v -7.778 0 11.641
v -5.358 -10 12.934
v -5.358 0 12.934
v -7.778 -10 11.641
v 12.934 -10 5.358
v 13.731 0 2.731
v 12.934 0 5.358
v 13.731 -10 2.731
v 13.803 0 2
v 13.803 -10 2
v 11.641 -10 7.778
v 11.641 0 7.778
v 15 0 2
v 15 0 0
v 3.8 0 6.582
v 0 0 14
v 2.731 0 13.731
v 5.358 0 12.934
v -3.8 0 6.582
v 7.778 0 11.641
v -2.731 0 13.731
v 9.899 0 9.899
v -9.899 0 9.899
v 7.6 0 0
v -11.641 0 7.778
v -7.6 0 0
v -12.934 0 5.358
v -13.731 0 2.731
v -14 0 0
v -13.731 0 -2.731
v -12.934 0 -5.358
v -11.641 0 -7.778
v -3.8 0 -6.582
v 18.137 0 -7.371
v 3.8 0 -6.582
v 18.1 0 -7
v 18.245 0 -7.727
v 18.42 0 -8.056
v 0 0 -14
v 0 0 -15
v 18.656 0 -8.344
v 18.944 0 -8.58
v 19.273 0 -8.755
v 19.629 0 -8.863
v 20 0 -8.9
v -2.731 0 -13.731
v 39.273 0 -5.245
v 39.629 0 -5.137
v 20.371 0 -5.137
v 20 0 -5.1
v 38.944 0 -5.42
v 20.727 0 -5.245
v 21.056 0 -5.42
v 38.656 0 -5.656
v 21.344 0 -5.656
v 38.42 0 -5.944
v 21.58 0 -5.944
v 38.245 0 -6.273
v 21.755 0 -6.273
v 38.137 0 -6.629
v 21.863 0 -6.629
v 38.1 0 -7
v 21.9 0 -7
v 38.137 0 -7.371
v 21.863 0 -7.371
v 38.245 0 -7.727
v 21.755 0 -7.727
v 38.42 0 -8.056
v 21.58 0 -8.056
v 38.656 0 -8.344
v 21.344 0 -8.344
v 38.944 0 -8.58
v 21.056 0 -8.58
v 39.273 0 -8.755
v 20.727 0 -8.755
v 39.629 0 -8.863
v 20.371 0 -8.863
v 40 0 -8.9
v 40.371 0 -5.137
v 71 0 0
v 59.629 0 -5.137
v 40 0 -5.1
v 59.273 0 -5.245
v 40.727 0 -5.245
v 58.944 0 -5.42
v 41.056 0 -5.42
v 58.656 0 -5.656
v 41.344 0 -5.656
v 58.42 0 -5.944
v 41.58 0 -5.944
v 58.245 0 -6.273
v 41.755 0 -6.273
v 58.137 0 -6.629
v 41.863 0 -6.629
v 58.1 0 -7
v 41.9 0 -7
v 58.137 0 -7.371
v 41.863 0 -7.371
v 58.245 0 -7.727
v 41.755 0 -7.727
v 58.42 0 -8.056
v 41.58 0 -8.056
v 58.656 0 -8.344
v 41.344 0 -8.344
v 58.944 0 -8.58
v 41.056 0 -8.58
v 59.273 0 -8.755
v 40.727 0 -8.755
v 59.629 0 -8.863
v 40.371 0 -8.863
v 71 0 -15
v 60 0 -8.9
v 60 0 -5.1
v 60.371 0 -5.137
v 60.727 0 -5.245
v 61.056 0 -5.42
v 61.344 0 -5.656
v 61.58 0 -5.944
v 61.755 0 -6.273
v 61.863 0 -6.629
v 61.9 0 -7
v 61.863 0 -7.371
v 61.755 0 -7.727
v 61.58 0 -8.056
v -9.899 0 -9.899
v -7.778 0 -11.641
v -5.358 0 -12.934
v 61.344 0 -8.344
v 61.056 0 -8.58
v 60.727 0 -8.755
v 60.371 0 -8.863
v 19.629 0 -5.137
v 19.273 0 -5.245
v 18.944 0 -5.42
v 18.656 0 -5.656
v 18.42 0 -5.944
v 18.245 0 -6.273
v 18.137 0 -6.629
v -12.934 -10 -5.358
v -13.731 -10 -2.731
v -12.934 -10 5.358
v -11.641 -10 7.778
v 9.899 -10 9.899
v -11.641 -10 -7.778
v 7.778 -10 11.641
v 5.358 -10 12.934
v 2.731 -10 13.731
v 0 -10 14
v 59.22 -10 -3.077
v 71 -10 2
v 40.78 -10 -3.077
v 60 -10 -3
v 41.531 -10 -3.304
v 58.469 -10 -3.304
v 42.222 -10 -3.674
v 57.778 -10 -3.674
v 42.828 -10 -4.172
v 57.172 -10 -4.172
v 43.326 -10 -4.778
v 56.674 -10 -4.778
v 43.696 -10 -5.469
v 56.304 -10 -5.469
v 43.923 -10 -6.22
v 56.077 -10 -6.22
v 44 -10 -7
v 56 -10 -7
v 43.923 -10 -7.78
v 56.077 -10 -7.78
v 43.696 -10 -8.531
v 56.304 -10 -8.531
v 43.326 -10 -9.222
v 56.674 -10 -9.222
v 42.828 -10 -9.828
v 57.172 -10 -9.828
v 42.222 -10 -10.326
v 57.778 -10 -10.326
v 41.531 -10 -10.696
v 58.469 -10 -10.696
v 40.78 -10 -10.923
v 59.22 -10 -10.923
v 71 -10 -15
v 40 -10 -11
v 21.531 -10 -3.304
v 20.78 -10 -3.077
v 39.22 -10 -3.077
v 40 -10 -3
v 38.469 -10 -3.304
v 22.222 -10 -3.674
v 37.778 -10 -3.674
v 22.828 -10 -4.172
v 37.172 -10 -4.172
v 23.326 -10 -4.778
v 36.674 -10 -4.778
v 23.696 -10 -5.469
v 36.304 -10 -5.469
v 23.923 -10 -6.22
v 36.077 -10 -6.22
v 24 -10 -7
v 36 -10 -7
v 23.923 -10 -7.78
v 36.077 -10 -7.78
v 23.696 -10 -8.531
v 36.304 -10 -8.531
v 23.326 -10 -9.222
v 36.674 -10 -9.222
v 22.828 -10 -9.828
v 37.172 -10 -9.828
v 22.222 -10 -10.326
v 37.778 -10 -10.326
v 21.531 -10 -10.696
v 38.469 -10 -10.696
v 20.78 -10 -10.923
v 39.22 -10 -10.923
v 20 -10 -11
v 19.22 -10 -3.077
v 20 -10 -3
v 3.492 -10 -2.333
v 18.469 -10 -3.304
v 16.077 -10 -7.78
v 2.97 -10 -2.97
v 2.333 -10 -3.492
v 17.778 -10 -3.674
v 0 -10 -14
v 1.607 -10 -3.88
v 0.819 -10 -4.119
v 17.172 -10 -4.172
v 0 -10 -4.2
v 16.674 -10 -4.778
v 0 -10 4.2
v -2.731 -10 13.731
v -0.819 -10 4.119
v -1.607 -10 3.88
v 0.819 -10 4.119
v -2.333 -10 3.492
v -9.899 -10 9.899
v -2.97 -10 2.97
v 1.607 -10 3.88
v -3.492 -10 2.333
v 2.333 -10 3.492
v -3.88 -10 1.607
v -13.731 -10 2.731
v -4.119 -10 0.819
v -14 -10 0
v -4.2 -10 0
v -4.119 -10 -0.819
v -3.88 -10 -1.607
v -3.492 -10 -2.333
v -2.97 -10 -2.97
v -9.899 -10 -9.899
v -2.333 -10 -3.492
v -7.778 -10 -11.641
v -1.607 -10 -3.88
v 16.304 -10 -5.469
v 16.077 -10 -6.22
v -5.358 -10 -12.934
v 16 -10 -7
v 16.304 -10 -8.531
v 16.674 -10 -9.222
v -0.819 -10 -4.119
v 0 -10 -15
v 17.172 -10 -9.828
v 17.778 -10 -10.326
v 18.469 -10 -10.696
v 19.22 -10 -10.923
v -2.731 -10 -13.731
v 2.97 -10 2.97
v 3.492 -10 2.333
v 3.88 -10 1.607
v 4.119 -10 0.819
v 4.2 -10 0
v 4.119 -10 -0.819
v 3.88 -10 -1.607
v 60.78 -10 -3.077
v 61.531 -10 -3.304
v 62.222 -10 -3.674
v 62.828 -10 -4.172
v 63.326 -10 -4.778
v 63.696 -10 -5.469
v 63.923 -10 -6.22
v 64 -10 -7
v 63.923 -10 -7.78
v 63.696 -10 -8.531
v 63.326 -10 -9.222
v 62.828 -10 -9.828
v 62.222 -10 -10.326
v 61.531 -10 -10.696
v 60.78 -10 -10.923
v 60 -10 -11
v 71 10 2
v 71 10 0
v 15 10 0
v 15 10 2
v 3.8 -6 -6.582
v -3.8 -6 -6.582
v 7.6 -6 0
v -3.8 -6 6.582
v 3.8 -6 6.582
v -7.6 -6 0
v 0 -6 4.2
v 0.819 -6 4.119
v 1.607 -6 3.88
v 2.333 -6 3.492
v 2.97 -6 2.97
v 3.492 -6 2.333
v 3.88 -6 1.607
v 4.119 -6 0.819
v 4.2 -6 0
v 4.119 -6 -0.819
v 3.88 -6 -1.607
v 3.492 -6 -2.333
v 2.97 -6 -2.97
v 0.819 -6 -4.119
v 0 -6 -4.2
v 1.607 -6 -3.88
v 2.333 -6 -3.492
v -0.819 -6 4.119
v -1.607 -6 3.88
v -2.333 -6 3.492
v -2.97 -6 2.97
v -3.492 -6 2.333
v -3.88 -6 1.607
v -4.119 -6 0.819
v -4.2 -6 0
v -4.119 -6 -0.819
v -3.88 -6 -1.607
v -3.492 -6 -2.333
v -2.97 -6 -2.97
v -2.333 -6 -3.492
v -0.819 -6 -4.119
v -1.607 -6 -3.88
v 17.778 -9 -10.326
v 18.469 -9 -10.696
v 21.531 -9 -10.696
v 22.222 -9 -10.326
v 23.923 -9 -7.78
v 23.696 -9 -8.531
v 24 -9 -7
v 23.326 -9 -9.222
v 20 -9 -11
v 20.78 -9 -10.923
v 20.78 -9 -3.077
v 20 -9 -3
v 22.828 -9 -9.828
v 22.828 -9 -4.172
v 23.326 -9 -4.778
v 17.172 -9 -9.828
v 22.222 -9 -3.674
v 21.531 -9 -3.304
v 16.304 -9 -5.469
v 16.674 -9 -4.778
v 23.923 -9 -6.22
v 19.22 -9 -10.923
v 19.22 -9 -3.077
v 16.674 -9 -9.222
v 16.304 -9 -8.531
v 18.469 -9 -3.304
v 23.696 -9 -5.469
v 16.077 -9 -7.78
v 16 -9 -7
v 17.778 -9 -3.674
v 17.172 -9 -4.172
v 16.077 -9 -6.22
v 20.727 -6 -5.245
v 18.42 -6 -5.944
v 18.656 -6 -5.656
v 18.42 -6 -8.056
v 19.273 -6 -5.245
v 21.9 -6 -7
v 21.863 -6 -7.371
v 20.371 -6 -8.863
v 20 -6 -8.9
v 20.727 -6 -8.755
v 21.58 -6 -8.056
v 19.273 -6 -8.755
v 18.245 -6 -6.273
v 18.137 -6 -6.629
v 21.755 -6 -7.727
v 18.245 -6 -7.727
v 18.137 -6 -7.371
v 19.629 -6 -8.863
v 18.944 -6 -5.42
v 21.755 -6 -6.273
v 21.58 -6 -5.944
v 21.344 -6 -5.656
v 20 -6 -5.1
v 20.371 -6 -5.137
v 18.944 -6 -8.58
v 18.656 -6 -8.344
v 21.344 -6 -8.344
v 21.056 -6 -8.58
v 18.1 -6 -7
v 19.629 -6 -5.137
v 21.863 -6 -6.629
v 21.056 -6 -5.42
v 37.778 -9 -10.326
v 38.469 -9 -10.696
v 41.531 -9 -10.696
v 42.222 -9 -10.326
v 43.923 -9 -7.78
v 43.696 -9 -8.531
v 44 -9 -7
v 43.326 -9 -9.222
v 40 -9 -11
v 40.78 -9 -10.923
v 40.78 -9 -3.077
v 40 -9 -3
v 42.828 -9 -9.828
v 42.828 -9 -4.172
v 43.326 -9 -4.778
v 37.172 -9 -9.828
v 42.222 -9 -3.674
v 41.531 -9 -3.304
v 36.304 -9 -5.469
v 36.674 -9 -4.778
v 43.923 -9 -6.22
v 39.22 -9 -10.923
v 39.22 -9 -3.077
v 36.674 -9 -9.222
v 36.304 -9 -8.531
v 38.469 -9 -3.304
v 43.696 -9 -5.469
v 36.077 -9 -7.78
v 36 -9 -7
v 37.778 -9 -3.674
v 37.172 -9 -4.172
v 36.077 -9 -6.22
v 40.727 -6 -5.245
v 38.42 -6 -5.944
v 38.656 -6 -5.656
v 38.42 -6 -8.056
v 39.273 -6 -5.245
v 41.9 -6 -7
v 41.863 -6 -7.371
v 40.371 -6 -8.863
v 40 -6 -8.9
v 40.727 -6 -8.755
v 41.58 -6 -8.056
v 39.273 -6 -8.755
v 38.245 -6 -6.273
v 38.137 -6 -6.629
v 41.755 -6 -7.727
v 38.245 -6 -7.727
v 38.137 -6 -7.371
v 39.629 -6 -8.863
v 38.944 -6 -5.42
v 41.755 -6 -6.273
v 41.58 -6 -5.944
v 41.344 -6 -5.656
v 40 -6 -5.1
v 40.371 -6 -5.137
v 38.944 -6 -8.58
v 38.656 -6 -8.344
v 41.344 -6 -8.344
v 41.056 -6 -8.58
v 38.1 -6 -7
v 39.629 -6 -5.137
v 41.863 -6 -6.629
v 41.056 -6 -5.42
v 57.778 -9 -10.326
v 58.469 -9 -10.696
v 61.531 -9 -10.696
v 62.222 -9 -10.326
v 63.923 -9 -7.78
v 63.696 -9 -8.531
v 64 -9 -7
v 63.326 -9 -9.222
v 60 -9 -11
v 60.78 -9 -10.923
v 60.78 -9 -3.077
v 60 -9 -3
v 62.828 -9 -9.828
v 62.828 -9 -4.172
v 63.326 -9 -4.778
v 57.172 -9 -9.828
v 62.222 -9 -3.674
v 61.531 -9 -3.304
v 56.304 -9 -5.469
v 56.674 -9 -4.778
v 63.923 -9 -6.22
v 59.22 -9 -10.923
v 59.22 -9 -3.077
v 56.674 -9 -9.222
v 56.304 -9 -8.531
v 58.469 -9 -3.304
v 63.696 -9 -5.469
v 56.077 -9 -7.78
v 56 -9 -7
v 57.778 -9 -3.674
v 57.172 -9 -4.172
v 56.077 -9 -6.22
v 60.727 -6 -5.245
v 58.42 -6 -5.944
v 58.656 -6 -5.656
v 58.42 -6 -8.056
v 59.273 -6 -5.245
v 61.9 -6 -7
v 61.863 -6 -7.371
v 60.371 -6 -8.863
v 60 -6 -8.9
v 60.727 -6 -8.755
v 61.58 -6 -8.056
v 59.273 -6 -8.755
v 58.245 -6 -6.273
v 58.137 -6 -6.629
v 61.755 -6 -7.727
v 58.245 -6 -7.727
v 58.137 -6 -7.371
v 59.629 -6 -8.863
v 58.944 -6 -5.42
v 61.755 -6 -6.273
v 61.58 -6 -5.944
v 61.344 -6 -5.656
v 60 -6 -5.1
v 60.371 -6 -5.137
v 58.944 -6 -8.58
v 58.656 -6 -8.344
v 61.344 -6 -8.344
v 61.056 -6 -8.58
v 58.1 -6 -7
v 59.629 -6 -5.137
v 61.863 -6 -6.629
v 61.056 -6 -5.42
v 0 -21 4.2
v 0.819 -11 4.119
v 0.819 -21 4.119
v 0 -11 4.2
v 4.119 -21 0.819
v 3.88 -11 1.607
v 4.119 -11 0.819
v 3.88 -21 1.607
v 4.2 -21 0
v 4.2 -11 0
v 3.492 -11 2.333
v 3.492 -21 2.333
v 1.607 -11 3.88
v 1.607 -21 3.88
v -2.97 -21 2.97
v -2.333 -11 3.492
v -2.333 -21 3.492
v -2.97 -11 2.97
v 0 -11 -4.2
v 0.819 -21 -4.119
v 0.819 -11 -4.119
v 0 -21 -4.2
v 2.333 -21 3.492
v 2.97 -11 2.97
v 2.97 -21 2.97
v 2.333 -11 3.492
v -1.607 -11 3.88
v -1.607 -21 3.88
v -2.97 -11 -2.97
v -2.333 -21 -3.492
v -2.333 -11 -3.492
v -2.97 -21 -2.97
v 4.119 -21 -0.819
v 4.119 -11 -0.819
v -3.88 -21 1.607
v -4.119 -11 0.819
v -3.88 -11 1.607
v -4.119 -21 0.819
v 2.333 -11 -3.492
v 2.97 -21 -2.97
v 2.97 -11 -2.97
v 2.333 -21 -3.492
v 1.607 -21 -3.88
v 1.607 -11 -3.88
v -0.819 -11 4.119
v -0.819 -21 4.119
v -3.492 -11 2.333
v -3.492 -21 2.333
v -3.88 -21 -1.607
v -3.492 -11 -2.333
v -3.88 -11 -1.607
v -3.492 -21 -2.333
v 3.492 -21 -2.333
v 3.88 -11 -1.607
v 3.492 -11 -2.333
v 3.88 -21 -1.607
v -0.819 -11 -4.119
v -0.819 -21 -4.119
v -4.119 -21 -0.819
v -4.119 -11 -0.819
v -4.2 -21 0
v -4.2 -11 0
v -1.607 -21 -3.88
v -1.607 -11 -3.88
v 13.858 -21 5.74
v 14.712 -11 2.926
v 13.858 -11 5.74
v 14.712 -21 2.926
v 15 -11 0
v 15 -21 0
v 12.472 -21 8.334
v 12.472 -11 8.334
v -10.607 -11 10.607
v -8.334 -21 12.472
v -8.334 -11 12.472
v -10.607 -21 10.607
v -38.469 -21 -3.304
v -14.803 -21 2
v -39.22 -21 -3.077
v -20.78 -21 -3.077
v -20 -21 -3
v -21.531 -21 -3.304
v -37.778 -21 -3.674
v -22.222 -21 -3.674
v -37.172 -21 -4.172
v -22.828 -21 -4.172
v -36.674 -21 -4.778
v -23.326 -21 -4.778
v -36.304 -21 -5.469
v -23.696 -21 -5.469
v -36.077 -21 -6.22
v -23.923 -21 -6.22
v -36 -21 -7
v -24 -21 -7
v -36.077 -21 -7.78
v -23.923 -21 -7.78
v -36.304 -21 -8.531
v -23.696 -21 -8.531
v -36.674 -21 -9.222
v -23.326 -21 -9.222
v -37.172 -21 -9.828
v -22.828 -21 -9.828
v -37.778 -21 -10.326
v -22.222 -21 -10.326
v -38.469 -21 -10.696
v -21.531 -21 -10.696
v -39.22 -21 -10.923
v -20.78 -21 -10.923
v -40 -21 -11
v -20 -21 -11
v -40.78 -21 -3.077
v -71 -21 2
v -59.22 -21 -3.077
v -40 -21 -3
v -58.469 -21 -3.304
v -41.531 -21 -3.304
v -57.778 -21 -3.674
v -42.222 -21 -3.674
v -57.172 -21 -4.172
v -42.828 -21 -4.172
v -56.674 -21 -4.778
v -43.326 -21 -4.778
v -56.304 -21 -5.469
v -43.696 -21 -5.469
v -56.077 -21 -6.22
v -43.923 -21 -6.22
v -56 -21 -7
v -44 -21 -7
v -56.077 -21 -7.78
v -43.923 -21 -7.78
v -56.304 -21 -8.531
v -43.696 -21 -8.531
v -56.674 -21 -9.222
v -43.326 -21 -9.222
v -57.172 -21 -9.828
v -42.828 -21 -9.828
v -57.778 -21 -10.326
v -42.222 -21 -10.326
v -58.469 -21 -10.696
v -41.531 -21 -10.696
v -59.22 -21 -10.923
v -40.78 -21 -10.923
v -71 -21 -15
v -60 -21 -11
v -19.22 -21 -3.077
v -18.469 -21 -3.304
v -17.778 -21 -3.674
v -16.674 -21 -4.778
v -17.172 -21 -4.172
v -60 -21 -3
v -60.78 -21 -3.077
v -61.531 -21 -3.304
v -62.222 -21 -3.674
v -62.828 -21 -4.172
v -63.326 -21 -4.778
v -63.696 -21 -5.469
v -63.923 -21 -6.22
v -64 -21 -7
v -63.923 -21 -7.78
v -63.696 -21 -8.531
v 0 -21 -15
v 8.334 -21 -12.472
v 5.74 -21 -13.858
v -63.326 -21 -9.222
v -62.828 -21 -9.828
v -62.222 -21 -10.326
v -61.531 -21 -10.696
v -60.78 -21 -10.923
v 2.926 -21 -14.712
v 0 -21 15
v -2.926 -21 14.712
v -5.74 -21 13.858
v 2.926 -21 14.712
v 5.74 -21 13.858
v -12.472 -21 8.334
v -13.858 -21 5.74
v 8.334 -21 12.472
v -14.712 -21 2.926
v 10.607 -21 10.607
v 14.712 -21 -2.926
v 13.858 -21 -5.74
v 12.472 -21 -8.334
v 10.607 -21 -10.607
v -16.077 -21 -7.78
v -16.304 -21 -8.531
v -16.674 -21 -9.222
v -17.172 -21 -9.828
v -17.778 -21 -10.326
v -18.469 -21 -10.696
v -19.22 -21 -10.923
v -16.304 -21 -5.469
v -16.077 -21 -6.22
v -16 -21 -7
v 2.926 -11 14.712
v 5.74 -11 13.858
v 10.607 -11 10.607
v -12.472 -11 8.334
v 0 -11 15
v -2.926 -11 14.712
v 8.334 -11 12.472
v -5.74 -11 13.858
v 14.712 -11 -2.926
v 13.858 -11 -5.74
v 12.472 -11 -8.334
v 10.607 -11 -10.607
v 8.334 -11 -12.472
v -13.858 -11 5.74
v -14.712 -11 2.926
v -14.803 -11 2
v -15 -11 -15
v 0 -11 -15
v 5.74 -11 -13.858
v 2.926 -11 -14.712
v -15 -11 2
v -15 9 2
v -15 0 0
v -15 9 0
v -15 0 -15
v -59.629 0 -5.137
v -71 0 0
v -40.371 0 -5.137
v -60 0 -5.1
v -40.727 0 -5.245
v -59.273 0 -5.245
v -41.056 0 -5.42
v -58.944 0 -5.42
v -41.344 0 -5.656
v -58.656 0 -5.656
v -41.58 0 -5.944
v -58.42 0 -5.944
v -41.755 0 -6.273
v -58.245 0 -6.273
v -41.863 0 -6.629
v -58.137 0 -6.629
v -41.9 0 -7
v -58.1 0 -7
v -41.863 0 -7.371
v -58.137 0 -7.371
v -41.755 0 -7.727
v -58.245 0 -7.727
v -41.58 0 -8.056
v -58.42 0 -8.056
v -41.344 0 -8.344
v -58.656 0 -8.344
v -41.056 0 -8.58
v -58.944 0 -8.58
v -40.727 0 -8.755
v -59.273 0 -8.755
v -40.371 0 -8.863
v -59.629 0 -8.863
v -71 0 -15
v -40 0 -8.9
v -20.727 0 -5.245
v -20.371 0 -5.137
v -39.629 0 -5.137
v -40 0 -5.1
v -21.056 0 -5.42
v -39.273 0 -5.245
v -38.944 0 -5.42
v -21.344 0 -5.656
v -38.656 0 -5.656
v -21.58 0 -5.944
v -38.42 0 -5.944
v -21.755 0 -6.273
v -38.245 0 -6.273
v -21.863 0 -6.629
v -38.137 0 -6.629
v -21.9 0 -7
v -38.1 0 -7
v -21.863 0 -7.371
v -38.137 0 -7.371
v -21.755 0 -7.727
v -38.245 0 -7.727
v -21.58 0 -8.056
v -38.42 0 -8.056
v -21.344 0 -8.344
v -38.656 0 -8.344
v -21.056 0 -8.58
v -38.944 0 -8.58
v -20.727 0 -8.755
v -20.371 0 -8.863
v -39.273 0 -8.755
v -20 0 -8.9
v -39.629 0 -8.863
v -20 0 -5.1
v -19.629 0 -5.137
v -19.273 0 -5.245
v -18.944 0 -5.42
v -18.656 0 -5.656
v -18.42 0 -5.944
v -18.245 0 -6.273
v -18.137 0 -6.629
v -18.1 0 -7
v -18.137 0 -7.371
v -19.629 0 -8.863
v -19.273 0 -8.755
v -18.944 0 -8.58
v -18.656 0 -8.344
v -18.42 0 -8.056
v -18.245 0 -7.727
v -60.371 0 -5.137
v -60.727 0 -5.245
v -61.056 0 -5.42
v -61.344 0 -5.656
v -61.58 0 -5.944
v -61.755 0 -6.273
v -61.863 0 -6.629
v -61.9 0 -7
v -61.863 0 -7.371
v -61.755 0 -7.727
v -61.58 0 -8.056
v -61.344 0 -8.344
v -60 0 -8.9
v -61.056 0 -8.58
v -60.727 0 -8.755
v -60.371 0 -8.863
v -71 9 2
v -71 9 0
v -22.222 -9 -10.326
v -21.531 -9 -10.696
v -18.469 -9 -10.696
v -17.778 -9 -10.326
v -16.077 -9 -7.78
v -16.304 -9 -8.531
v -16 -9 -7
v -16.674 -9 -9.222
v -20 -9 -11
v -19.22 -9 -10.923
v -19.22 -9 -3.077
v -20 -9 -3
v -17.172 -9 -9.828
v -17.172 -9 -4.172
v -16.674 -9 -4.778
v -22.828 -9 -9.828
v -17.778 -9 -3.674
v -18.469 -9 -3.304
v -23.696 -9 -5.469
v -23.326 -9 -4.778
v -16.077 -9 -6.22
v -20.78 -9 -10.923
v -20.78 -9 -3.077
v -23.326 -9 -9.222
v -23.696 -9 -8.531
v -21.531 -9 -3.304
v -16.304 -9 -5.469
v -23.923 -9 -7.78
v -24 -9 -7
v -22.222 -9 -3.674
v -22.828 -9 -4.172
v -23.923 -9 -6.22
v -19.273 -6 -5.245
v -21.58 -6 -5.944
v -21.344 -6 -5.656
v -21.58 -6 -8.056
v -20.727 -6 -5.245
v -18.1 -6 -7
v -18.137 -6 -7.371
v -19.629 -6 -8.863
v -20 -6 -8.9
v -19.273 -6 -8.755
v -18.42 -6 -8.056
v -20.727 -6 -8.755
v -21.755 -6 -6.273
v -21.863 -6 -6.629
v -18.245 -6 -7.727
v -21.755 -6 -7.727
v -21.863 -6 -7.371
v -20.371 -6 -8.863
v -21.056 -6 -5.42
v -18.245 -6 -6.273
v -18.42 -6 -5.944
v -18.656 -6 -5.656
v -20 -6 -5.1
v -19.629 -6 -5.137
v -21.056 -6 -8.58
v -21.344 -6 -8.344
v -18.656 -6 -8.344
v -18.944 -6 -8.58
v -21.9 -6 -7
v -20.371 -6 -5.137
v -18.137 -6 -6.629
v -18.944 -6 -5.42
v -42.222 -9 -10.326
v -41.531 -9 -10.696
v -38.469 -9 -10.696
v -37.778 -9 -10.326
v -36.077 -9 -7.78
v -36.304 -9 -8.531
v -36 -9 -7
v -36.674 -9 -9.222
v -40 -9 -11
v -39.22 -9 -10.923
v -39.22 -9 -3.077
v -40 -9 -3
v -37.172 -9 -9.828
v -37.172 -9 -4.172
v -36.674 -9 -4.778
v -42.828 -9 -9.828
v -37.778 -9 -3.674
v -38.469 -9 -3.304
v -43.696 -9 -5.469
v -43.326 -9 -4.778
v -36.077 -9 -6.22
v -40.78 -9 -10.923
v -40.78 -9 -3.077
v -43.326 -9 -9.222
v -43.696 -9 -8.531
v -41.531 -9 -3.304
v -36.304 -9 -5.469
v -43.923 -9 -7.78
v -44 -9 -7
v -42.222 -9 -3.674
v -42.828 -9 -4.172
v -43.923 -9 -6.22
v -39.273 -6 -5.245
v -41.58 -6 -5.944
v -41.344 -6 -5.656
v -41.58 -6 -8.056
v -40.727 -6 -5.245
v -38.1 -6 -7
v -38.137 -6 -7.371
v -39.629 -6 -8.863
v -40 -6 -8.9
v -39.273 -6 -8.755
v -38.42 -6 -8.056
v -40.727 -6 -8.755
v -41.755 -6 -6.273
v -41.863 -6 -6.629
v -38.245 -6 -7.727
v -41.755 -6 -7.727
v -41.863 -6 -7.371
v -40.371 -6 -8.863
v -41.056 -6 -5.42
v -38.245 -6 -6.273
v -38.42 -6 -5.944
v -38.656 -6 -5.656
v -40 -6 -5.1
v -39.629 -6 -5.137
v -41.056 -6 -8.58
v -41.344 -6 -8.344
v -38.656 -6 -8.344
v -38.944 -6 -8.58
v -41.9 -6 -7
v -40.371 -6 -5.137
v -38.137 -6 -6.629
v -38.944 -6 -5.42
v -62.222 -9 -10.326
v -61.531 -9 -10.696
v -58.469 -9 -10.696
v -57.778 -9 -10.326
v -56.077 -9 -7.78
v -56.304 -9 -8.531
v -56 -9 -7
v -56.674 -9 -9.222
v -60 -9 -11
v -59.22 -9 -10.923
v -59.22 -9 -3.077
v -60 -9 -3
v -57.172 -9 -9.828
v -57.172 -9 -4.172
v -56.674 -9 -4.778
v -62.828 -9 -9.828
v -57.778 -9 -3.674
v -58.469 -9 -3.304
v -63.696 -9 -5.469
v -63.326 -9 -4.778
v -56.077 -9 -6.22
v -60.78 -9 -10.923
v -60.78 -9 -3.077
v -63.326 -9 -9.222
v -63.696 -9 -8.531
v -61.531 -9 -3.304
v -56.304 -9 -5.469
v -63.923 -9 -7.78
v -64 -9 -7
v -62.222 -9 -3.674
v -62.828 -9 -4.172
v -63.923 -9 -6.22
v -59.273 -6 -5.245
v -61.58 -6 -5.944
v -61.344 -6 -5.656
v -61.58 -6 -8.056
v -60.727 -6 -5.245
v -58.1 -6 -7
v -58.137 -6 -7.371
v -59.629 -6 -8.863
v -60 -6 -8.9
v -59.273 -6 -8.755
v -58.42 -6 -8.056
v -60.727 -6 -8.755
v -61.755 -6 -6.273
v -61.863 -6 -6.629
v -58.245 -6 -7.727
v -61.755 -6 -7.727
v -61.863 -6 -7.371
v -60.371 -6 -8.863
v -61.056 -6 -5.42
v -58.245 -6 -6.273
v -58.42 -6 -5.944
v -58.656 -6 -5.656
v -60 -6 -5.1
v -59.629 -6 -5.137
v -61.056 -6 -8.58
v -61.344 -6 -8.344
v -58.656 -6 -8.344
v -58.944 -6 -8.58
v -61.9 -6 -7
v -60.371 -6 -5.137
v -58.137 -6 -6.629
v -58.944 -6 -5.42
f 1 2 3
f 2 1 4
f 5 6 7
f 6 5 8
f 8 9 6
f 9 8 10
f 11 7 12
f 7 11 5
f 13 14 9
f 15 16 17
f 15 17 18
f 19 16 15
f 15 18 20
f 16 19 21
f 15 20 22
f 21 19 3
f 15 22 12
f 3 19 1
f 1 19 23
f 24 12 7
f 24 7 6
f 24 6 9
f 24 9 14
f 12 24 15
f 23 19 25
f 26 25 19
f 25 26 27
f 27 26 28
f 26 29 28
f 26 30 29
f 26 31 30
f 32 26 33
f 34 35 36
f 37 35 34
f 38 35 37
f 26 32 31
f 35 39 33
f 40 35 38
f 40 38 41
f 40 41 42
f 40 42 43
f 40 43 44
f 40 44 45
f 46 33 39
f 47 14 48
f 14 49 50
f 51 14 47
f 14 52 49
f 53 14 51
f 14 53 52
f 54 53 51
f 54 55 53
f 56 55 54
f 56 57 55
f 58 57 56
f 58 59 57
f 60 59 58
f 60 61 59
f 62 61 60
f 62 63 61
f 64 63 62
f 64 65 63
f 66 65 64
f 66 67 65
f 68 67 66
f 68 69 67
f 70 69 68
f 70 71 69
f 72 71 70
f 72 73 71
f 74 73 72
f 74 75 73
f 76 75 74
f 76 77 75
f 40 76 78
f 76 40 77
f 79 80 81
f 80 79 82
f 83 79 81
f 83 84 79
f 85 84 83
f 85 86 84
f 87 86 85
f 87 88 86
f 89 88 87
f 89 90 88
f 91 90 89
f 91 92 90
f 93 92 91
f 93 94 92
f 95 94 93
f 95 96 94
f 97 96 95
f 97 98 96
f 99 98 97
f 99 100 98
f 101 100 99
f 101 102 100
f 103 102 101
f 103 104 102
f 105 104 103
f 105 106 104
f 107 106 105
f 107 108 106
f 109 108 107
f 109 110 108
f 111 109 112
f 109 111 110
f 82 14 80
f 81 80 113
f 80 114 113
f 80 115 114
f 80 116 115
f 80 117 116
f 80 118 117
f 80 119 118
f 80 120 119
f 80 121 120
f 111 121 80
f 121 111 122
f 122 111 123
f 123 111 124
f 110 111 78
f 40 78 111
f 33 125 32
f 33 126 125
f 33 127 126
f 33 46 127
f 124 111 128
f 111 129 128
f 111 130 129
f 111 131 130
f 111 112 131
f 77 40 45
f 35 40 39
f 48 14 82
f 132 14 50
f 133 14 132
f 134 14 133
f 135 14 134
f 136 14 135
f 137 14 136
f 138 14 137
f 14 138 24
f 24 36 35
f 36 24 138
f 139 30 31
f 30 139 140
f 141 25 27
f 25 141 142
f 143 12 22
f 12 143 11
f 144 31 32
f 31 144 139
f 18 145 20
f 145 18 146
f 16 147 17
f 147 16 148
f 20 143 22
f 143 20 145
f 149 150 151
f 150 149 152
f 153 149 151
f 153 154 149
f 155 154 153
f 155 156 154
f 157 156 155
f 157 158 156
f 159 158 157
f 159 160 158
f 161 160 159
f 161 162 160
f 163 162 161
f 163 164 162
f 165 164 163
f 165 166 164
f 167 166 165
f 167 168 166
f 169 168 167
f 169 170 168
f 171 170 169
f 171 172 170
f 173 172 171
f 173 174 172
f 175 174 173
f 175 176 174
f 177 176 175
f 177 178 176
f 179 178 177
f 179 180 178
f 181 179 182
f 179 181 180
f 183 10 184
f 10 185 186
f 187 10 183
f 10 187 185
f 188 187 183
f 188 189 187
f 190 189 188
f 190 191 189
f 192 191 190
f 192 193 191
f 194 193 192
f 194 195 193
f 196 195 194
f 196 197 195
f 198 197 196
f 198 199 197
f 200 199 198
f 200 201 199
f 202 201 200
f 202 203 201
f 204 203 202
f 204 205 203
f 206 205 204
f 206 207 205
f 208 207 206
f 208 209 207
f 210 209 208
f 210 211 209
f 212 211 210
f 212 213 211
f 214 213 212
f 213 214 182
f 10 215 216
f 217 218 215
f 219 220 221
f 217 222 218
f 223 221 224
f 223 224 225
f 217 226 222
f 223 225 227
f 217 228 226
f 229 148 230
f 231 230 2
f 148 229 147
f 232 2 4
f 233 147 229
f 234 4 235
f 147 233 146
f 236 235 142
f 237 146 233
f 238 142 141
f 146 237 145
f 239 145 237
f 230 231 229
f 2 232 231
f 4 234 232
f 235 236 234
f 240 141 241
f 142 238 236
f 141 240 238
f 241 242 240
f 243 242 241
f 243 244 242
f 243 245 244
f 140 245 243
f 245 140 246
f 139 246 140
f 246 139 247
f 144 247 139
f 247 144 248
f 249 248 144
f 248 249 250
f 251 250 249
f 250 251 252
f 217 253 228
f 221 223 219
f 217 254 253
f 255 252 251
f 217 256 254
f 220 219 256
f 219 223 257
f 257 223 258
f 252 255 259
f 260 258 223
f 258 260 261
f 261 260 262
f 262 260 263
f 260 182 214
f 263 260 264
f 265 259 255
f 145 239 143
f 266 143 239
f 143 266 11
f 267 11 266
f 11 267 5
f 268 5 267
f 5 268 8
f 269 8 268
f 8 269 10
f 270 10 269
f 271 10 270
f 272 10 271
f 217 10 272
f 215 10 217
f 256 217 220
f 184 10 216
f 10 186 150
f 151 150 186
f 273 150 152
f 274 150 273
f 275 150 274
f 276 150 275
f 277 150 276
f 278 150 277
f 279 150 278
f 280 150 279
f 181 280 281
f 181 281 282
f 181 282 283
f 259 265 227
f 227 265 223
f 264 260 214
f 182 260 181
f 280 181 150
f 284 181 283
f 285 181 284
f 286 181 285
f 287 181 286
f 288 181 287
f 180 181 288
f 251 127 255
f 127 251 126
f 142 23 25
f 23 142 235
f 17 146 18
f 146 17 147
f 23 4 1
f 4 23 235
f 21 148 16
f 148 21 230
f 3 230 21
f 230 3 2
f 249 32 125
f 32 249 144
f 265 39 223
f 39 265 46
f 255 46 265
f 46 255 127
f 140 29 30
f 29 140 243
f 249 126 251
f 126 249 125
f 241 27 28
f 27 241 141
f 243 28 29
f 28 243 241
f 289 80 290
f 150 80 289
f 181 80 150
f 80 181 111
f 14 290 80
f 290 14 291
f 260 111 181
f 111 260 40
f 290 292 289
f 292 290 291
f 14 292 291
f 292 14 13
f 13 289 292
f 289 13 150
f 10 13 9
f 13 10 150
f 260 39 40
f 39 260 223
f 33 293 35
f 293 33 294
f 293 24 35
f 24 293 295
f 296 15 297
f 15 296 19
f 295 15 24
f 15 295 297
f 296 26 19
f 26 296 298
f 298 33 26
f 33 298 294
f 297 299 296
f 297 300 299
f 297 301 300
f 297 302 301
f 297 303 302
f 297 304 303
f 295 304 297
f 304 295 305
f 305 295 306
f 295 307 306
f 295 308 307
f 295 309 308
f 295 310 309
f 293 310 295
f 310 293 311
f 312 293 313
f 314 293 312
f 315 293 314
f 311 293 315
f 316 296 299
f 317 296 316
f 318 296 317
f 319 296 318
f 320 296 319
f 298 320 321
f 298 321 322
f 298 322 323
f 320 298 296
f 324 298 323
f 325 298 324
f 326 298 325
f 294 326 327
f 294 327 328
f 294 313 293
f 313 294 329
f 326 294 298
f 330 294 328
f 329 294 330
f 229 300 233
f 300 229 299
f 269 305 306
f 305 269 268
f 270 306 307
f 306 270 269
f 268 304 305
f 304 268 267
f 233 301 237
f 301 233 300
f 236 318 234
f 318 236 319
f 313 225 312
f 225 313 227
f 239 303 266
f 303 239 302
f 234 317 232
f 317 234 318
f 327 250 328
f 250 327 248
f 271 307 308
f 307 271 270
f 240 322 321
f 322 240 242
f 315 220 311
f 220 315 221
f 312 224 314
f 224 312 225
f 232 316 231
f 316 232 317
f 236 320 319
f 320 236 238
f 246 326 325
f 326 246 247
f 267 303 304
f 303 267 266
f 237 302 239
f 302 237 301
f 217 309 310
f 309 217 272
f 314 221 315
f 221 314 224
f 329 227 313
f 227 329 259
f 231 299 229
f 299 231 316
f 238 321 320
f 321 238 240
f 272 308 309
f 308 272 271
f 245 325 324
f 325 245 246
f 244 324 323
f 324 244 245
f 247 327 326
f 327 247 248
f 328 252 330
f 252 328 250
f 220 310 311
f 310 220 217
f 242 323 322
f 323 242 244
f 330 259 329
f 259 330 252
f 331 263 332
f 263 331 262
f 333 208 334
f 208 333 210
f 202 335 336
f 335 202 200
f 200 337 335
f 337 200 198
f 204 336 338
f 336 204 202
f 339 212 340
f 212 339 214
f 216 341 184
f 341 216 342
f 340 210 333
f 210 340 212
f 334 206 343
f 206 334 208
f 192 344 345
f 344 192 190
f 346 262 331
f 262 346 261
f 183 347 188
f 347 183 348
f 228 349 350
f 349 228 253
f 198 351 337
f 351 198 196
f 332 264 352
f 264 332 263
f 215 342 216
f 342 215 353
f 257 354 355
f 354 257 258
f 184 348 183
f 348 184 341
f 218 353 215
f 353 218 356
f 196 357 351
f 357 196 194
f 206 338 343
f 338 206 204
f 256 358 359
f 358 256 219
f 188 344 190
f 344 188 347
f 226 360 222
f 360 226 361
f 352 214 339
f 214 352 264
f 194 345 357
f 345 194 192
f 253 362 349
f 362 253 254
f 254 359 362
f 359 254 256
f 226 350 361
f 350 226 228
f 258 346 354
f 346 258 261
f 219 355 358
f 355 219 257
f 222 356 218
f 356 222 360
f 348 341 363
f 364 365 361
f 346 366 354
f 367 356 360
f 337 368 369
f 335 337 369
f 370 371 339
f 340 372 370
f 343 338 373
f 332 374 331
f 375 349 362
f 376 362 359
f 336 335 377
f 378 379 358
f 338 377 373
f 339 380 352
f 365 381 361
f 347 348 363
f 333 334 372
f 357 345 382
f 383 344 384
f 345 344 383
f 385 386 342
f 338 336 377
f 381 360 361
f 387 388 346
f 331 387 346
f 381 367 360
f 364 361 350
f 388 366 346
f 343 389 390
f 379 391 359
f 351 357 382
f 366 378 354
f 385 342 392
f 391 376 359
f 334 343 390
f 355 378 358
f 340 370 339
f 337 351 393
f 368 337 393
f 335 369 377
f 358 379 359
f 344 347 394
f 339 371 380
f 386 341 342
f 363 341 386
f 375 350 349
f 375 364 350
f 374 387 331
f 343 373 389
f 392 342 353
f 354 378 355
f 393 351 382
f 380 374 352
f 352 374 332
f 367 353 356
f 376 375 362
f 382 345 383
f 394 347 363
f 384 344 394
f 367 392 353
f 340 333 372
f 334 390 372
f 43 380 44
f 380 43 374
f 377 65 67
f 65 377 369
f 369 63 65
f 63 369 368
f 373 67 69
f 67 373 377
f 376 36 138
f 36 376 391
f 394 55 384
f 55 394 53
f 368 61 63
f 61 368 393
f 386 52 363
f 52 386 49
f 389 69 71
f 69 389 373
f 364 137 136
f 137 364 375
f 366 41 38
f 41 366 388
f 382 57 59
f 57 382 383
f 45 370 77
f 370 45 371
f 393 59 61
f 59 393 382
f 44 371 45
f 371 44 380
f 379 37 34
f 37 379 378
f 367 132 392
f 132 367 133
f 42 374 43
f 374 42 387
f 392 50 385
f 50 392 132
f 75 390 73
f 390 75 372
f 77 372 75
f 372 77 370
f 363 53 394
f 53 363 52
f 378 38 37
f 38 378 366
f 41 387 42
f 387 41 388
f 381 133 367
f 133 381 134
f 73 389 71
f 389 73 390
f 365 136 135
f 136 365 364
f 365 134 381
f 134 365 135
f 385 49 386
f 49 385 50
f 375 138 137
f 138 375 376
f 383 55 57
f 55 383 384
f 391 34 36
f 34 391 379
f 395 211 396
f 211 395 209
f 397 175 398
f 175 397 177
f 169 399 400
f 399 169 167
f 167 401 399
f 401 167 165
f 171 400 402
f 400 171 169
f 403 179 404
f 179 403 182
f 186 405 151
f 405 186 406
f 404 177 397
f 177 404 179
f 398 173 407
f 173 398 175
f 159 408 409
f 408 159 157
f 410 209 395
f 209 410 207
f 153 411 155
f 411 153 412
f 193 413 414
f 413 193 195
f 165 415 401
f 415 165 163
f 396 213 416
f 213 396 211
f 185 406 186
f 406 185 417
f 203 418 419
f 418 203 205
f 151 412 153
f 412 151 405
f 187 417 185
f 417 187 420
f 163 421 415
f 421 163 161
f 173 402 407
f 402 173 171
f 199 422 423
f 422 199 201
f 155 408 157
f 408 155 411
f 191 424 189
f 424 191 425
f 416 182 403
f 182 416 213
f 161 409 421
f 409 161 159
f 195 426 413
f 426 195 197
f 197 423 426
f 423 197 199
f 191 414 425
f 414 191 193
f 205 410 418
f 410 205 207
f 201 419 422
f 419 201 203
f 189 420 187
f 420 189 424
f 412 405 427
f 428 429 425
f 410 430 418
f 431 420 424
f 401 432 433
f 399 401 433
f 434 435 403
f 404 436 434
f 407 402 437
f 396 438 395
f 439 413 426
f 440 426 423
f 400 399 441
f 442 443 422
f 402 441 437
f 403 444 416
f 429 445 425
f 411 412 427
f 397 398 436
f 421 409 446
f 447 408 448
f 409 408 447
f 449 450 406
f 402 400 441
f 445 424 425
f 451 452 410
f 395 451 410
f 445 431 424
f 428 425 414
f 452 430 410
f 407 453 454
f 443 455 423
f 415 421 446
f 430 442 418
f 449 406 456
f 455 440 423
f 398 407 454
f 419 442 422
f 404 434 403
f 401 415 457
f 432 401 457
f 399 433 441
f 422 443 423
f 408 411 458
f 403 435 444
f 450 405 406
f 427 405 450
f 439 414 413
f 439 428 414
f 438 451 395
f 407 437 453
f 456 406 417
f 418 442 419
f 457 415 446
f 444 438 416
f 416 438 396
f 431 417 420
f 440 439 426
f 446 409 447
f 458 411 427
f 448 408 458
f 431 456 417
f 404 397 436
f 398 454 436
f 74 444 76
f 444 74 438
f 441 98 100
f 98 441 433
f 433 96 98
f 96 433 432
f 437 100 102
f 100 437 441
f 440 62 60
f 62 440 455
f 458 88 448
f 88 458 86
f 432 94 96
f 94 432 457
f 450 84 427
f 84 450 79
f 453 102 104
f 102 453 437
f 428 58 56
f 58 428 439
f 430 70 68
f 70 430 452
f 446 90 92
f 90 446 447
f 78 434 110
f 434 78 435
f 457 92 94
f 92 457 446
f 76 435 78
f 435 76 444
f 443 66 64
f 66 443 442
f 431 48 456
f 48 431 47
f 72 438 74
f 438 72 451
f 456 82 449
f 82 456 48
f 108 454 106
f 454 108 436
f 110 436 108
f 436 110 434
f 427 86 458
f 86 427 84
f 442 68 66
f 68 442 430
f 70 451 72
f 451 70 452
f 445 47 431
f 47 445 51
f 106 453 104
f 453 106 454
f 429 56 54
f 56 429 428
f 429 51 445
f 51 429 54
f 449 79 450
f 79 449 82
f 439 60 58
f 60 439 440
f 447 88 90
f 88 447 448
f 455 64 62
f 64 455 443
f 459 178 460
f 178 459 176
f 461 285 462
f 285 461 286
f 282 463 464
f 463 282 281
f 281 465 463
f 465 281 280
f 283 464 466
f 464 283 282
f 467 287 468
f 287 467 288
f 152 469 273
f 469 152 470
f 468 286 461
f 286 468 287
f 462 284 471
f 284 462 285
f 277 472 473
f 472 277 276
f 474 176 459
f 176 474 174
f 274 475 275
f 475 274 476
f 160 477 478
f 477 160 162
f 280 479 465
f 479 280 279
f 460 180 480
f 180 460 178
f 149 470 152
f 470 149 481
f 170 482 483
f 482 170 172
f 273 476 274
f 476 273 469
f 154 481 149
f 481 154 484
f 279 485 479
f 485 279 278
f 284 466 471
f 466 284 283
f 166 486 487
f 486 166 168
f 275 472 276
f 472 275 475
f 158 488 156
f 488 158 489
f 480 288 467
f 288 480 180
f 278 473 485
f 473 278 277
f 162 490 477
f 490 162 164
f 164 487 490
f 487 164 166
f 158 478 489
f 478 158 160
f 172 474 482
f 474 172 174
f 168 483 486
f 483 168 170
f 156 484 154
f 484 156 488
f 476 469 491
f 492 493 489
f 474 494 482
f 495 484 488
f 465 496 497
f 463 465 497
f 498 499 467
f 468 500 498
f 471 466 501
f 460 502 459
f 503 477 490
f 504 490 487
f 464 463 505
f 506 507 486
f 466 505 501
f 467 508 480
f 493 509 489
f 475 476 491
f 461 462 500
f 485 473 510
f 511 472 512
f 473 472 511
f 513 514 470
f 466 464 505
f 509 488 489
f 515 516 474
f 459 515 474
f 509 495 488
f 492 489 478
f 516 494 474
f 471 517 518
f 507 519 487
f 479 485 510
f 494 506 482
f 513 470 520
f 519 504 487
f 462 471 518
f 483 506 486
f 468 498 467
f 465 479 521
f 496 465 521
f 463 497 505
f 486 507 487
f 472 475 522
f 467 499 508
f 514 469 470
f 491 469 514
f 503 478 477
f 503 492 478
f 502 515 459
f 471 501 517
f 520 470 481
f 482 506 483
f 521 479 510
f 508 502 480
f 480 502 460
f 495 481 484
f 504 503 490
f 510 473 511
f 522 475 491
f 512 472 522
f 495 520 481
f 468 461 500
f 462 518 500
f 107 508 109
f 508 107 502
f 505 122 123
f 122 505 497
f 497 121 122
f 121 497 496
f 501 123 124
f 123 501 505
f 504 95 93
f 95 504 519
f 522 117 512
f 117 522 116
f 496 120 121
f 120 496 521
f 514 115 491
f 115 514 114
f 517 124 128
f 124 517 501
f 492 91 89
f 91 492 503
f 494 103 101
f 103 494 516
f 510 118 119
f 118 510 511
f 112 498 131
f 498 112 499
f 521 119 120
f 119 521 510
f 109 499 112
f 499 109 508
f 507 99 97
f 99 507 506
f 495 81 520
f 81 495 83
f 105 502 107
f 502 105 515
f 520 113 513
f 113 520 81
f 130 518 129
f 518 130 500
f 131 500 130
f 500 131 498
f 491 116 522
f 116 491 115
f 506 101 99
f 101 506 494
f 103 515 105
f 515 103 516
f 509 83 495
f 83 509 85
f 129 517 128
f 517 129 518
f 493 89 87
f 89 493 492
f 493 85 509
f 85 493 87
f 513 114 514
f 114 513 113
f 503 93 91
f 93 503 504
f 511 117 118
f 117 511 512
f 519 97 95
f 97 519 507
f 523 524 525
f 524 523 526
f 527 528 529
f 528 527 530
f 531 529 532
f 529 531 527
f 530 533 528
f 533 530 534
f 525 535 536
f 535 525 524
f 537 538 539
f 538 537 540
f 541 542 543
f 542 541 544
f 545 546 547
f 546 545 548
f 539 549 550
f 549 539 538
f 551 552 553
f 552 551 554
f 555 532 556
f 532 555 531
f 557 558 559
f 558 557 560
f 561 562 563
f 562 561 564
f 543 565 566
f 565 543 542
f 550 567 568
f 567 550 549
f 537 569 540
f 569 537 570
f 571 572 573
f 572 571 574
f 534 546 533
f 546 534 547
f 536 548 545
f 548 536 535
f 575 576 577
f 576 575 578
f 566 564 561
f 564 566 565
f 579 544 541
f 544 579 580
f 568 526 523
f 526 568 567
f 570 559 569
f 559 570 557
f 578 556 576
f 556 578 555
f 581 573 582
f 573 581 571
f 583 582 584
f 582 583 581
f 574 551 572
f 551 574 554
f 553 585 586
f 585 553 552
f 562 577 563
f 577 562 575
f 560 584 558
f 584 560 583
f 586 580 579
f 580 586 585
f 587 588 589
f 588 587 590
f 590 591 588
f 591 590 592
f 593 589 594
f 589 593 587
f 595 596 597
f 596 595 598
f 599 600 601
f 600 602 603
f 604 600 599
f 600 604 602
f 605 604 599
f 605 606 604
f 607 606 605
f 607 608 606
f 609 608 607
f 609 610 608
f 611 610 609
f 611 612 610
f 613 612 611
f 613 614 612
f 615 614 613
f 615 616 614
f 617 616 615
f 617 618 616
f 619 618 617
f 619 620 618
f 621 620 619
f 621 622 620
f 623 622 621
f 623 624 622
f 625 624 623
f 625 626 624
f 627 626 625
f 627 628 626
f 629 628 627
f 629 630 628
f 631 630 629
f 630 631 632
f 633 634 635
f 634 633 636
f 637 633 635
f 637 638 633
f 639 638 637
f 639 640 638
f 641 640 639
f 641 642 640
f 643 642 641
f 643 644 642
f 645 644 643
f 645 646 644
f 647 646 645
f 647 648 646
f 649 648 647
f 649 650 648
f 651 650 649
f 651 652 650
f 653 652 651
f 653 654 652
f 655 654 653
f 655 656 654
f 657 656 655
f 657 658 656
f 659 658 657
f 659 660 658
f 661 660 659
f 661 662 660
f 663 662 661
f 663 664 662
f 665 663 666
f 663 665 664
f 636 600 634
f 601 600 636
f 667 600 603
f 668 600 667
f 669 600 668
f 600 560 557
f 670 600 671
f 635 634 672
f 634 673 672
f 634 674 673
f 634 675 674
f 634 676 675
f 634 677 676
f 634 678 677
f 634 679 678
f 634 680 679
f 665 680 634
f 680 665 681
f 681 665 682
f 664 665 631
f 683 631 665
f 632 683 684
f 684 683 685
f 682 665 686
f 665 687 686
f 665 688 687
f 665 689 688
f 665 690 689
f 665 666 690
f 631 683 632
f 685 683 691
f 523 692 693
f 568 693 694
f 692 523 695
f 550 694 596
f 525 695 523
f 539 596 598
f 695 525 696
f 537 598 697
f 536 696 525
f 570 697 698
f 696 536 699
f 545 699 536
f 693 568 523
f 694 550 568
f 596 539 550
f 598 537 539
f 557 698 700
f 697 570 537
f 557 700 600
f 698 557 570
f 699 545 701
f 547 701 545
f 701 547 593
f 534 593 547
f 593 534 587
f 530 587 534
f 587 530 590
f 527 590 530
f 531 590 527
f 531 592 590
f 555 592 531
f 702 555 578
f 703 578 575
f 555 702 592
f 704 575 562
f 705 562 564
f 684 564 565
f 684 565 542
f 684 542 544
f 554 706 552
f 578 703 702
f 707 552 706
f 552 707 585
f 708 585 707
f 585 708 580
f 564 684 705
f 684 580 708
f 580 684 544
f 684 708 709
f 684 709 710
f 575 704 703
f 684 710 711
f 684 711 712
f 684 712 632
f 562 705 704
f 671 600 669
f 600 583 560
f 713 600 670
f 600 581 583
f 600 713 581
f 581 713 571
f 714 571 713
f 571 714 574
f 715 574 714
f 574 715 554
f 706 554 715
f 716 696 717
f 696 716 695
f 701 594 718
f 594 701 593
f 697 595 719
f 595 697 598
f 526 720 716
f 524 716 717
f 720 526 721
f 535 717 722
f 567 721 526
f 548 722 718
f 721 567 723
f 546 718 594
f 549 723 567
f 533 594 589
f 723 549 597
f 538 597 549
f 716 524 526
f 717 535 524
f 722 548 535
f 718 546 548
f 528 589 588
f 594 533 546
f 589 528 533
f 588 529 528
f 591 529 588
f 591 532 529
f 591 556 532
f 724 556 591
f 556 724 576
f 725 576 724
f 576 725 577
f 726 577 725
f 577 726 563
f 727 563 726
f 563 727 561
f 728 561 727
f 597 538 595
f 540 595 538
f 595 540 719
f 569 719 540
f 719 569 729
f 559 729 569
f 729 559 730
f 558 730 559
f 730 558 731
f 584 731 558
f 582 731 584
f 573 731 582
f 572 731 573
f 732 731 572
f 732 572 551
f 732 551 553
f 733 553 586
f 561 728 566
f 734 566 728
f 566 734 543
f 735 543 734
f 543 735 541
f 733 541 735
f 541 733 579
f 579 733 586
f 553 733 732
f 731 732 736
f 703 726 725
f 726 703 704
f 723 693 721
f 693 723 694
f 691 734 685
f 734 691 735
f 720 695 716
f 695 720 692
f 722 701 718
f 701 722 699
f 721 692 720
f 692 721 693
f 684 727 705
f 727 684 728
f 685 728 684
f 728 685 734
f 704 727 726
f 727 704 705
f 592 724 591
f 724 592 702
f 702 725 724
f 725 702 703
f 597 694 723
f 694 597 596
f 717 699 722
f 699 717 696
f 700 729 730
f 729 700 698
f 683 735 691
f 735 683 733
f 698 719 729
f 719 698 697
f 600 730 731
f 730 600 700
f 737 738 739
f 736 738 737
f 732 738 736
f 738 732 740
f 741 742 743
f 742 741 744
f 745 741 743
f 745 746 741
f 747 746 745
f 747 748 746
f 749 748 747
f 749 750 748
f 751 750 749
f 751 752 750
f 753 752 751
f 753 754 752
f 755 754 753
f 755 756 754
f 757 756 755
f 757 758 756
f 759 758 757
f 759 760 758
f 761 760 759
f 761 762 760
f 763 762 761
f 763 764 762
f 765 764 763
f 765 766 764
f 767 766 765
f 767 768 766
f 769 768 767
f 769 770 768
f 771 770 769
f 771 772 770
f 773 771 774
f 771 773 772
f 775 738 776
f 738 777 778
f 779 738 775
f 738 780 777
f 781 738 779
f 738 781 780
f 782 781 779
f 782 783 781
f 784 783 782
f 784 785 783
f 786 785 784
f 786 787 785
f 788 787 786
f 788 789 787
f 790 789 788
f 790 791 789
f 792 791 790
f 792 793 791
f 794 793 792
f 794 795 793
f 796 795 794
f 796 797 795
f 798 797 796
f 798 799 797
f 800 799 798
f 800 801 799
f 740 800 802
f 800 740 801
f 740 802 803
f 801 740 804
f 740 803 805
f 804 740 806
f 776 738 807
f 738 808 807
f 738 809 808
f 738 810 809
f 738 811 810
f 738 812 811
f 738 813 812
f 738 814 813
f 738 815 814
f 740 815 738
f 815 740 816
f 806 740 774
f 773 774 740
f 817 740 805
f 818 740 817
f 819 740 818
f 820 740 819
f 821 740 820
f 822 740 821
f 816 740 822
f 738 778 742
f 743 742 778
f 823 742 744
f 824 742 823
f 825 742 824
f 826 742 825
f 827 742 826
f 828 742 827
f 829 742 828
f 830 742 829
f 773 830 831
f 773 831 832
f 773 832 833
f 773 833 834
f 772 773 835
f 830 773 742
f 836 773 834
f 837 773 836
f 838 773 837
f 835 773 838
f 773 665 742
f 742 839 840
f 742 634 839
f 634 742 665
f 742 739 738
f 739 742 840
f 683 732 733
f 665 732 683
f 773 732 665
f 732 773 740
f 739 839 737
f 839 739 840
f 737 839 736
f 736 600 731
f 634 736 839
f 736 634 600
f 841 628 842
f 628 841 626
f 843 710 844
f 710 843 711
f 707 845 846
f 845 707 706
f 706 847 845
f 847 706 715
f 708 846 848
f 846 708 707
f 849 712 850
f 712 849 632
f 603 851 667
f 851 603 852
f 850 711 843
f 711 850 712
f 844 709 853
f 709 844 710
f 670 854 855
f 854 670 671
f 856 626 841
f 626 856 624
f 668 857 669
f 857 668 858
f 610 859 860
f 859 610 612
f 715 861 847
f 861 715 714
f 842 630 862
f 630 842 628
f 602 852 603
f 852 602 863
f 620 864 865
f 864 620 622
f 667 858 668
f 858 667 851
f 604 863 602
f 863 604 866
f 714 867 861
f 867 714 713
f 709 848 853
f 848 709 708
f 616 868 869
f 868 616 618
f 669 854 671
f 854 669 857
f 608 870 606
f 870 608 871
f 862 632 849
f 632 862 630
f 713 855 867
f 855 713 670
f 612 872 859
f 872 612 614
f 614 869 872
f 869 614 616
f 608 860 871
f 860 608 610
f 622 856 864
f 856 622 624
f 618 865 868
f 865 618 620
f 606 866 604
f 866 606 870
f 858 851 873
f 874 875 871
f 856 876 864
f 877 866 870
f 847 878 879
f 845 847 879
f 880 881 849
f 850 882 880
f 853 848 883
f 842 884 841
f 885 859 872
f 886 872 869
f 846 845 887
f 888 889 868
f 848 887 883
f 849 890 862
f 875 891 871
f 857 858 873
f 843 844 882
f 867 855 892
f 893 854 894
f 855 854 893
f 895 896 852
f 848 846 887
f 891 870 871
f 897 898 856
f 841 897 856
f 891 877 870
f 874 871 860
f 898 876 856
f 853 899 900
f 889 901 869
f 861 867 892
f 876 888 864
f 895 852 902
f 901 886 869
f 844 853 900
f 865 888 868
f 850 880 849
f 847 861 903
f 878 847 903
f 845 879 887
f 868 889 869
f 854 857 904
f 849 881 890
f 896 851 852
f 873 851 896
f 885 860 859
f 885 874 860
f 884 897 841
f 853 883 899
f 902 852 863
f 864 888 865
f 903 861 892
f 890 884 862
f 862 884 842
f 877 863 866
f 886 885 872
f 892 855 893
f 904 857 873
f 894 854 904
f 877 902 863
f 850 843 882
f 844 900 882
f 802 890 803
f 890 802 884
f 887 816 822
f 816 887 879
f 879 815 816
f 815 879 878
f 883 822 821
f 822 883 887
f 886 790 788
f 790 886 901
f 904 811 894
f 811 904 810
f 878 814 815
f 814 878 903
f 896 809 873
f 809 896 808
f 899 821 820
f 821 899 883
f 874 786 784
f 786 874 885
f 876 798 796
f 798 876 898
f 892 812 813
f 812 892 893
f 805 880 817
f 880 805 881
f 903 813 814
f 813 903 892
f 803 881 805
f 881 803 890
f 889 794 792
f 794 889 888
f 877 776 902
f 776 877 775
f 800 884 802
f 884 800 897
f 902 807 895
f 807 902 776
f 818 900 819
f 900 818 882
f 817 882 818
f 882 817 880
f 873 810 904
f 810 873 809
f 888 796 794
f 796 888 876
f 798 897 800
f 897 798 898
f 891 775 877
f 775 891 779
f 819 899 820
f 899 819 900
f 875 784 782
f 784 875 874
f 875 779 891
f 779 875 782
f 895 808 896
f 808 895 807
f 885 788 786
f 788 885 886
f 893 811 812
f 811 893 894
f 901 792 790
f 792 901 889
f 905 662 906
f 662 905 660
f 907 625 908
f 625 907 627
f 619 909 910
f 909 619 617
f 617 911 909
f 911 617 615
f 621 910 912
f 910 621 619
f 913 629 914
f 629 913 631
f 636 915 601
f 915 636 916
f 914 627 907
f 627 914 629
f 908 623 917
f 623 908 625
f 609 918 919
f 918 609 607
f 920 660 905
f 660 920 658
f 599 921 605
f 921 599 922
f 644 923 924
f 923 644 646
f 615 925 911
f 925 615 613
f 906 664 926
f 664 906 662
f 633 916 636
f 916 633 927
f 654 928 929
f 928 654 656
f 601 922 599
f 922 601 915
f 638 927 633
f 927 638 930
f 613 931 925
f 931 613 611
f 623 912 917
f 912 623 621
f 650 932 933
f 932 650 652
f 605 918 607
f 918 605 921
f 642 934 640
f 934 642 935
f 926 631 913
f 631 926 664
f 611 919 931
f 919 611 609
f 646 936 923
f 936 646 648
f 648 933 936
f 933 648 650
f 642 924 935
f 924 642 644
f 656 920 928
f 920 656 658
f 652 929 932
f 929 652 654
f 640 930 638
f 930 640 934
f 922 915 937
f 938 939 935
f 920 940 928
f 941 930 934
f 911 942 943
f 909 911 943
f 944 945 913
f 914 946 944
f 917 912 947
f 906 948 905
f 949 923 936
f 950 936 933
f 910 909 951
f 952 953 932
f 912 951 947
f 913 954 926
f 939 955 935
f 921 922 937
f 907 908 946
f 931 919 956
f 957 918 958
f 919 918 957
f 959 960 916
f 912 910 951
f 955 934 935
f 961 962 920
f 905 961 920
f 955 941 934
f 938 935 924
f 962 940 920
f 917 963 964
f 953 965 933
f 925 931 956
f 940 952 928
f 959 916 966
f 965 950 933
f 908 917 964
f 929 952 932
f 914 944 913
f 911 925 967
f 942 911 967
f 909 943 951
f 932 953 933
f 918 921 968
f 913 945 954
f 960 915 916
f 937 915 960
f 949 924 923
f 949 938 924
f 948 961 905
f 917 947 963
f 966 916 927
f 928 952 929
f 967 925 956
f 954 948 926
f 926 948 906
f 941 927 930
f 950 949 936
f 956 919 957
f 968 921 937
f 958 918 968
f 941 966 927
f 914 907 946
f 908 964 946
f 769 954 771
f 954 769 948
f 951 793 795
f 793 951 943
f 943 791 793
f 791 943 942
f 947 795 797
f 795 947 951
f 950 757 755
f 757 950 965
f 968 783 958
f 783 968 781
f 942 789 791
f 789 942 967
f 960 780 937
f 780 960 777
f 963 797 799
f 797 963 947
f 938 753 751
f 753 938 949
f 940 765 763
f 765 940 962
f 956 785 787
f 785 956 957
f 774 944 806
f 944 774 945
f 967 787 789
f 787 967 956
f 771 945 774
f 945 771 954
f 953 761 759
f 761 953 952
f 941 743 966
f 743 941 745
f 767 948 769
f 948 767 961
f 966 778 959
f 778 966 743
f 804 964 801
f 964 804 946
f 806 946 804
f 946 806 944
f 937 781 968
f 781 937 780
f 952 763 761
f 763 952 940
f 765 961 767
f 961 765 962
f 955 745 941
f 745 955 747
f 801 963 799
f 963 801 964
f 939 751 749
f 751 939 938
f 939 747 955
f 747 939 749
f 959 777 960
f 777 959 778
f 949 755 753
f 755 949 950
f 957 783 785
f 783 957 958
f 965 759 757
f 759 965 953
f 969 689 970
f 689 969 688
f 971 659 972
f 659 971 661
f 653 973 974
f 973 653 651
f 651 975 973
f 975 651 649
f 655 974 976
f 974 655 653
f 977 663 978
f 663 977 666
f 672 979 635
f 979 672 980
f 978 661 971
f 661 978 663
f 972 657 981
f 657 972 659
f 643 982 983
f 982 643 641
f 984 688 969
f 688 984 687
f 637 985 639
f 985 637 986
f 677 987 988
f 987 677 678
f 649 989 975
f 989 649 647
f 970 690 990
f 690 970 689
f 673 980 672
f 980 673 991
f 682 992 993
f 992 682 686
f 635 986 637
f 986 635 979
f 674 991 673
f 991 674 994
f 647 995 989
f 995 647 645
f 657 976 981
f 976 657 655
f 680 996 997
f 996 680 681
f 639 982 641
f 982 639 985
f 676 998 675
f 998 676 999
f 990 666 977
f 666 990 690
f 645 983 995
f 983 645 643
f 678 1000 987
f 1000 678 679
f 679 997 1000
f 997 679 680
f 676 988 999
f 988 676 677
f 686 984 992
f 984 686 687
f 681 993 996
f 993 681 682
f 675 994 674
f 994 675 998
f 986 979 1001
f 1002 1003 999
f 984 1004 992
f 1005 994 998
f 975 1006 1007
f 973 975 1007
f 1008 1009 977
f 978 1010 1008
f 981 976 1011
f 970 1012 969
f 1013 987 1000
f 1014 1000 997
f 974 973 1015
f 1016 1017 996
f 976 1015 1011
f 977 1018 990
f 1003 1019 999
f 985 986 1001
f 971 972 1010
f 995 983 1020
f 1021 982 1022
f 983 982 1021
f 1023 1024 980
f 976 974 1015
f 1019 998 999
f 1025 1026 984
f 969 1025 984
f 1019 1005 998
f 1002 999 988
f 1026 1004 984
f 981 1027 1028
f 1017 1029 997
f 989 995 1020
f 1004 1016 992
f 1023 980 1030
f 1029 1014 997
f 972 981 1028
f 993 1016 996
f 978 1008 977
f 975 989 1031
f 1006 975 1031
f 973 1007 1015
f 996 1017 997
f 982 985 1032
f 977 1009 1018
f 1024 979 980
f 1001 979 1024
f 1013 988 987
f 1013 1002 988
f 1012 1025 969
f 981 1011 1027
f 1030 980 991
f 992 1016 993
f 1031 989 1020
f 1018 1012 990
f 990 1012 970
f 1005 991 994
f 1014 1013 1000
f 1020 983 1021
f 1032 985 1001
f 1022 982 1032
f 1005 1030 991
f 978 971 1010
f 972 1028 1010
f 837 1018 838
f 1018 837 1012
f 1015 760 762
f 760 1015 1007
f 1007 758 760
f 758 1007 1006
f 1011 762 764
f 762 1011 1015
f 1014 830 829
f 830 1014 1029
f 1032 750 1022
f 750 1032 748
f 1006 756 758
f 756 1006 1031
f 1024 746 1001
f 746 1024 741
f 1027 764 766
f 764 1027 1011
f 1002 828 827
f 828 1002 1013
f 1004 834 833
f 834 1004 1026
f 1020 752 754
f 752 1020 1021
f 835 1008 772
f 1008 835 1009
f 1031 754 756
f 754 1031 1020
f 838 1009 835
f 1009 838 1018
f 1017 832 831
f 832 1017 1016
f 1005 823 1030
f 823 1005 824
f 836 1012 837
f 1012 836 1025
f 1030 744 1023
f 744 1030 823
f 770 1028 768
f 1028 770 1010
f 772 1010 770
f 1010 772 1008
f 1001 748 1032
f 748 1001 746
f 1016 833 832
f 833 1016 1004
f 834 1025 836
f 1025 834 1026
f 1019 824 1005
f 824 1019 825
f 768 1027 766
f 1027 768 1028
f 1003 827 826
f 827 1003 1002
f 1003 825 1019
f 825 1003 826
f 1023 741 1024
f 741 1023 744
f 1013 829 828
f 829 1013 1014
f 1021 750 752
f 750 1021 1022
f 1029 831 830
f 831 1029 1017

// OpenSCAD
/**
 * Martin Egli
 * 2024-09-07
 */
module axle_cut(loc_res = 32) {
    color("Red") {
        translate([0, 0, -2])
        cylinder(d = 15.2, h = 6+2, $fn = 6);
        translate([0, 0, -2])
        cylinder(d = 8.4, h = 40+2, $fn = loc_res);
    }
}

module screw_cut(loc_res = 32) {
    translate([0, 0, -20])
    cylinder(d = 8, h = 20, $fn = loc_res);
    translate([0, 0, 0])
    cylinder(d1 = 8, d2 = 3.8, h = 3, $fn = loc_res);
    translate([0, 0, 0])
    cylinder(d = 3.8, h = 20, $fn = loc_res);
}
*screw_cut();

module bender1(col = "Green", loc_res = 32) {
    color(col)
    difference() {
        union() {
            translate([0, 0, 0])
            cylinder(d = 28, h = 10, $fn = loc_res);
            
            translate([1, -15, 0])
            cube([70, 15, 10]);
            
            translate([15, 0, -(20-10)])
            cube([71-15, 2, 20]);
            translate([0, -15, 0])
            cube([20, 17, 10]);
        }    
        // cut
        axle_cut(loc_res = loc_res);
        // 3.5 mm holes
        translate([20, -7, 9])
        rotate([180, 0, 0])
        screw_cut(loc_res = loc_res);
        translate([40, -7, 9])
        rotate([180, 0, 0])
        screw_cut(loc_res = loc_res);
        translate([60, -7, 9])
        rotate([180, 0, 0])
        screw_cut(loc_res = loc_res);
        
        // look into
        *cube(30);
    }
}

module bender2(col = "blue", loc_res = 32) {
    color(col)
    difference() {
        union() {
            // +1 mm spacer
            translate([0, 0, 11])
            cylinder(d = 30, h = 10, $fn = loc_res);
            
            translate([-(71), -15, 0])
            cube([70-14, 15, 10+11]);
            
            translate([-(71), 0, -(20-11)])
            cube([71-15, 2, 20+10]);
            translate([-20, -15, 11])
            cube([20, 17, 10]);
        }    
        // cut
        axle_cut(loc_res = loc_res);
        // 3.5 mm holes
        translate([-20, -7, 9])
        rotate([180, 0, 0])
        screw_cut(loc_res = loc_res);
        translate([-40, -7, 9])
        rotate([180, 0, 0])
        screw_cut(loc_res = loc_res);
        translate([-60, -7, 9])
        rotate([180, 0, 0])
        screw_cut(loc_res = loc_res);
        
        // look into
        *cube(30);
    }
}
module puttogether(loc_res = 32) {
    *rotate([90, 0, 0])
    axle_cut(loc_res = loc_res);
    
    *color("LightBlue")
    translate([0, 0, -20])
    cube([100, 100, 20]);
    *color("LightGreen")
    translate([-100, 0, -20])
    cube([100, 100, 20]);
    
    translate([0, 0, 0])
    rotate([90, 0, 0])
    bender1();
    translate([0, 0, 0])
    rotate([90, 0, 0])
    bender2();
    
}
puttogether();

// print parts
*bender1(loc_res = 128); // 1 x
*bender2(loc_res = 128); // 1 x

*mirror([0, 0, 1])
bender1(loc_res = 128); // 1 x mirrored
*mirror([0, 0, 1])
bender2(loc_res = 128); // 1 x mirrored
